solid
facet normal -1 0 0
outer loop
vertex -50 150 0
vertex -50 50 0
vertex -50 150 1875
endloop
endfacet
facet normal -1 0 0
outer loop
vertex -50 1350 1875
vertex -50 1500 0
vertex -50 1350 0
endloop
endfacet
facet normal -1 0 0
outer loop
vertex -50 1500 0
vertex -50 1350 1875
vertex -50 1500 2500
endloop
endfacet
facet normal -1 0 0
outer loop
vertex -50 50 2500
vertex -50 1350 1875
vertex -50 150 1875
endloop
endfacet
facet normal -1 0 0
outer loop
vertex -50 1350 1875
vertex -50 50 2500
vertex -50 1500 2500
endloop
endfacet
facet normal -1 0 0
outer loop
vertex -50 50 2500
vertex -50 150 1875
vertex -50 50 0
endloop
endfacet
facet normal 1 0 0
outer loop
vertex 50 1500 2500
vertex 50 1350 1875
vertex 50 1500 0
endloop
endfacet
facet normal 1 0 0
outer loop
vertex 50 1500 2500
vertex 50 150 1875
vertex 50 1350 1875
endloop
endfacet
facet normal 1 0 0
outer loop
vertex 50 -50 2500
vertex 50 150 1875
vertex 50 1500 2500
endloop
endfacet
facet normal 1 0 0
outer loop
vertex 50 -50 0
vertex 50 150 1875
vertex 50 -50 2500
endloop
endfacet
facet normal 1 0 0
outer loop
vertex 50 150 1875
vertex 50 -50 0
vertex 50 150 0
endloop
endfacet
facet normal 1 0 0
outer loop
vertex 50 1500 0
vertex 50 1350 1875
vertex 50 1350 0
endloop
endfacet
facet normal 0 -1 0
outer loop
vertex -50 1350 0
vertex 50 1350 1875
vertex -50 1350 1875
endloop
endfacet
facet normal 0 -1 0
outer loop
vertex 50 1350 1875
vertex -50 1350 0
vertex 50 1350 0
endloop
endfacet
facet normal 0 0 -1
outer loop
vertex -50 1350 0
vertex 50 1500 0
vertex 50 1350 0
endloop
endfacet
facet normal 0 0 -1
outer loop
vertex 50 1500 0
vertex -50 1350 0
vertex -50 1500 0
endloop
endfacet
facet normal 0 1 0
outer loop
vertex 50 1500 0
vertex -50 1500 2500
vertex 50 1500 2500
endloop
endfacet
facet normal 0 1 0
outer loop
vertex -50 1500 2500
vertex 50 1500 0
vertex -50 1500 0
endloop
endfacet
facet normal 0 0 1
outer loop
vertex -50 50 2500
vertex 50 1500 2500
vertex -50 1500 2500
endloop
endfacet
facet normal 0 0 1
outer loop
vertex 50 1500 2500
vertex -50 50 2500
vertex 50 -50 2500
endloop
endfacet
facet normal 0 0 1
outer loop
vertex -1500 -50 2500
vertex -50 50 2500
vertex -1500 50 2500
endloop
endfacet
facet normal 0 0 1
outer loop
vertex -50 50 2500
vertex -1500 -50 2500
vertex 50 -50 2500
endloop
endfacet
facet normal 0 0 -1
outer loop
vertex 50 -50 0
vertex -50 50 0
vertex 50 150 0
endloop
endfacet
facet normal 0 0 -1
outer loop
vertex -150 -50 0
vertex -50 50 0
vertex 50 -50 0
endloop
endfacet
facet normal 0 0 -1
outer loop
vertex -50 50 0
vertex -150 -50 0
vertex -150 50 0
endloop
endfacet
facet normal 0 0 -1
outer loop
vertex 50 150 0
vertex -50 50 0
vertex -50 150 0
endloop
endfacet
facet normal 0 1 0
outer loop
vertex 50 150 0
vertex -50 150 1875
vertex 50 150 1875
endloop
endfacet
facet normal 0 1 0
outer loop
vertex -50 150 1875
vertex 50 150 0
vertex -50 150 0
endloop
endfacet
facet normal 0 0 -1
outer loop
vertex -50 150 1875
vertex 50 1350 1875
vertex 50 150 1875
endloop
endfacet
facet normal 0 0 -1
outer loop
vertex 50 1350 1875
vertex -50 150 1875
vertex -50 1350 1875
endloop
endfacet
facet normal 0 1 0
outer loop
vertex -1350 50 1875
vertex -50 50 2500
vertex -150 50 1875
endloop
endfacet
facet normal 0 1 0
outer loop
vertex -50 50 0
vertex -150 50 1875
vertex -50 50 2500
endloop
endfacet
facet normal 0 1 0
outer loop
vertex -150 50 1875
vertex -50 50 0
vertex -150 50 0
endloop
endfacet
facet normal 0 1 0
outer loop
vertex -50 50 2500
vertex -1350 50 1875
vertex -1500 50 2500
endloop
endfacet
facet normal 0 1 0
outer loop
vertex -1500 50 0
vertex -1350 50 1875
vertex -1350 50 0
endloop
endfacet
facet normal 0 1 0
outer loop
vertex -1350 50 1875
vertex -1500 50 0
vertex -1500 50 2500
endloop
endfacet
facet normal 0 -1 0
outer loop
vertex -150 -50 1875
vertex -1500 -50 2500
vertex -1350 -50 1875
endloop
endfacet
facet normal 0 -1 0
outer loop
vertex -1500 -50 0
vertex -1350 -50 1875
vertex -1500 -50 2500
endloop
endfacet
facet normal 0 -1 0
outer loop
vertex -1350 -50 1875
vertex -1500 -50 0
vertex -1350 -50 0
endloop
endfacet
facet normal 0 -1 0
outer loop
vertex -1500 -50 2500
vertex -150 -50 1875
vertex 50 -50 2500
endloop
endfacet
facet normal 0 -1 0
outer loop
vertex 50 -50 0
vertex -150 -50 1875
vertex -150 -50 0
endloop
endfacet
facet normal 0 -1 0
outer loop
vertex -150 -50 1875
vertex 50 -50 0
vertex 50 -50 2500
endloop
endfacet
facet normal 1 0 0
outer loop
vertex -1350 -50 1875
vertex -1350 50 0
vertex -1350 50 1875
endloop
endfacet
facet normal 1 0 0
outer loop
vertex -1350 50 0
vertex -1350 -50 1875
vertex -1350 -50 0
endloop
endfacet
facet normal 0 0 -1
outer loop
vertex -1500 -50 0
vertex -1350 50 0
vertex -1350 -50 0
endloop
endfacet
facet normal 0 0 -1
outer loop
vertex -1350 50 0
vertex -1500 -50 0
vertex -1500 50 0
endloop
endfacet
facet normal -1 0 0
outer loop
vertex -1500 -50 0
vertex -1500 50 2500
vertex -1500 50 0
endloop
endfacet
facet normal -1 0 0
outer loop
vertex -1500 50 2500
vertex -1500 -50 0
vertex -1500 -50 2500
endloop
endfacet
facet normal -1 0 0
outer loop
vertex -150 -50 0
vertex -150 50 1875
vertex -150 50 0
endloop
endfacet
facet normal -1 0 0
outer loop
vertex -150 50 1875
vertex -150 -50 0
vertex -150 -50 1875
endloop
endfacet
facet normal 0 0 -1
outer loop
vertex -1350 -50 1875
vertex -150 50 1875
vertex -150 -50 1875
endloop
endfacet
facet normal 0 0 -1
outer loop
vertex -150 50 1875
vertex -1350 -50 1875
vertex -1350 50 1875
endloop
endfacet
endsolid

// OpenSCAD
// file: modifiers/diagonalize.scad
include <../templates/basic-dims.scad>

module diagonalize_triangle_sketch(t = section_thickness) {
    x = sin(45) * t;
    y = cos(45) * t;

    polygon([
        [0, y],
        [x, 0],
        [0, -y]
    ]);
}

module diagonalize_triangle(t = section_thickness) {
    rotate([0, 0, 90])
    linear_extrude(section_height)
    diagonalize_triangle_sketch(t);
}

module diagonalize2D() {
    thickness = section_thickness / rt;

    trans = (section_thickness/2)*rt/2;
    len_scale = rt - section_thickness / (rt * section_width);

    rotate([0, 0, 45])
    translate([trans, 0, 0])
    scale([len_scale, 1/rt, 1])
    children();
}


module diagonalize3D(w = section_width, t = section_thickness, edges = "trans") {

    trans = (t/2)*rt/2;
    len_scale = rt - t / (rt * w);

    edge_angle = edges == "cis" ? 270 : 180;
    
    diagonalize_triangle(t/rt);

    translate([-w, w, 0])
    rotate([0, 0, edge_angle]) // 180 For continue, -90 (270) for end
    diagonalize_triangle(t/rt);

    rotate([0, 0, 45])
    translate([0, trans, 0])
    scale([1/rt, len_scale, 1])
    children();
}
// file: templates/basic-dims.scad
unit = 1000;

section_width = unit * 1.5;
section_height = unit * 2.5;
section_thickness = unit * 0.1;

rt = sqrt(2);

//  -- Notes --
//  Z is UP
//  X is FORWARD (out of the screen)
// file: modifiers/cornerize.scad
include <../templates/basic-dims.scad>

trim_depth = 10000;

module cornerize_trim(amount, height = section_height) {
    difference() {
        children();
        translate([-trim_depth/2, 0, 0])
        cube([trim_depth, amount, height]);
    }
}

//  Child 0 is front
//  Child 1 is side
module cornerize(front_width = section_width, front_thickness = section_thickness,
    side_width = section_width, side_thickness = section_thickness) {
    
    new_front_size = front_width - side_thickness/2;
    front_scale_amt = new_front_size / front_width;
    
    new_side_size = side_width - front_thickness/2;
    side_scale_amt = new_side_size / side_width;

    //translate([0, side_thickness/2, 0])
    //scale([1, front_scale_amt, 1])
    cornerize_trim(side_thickness/2)
    children(0);

    rotate([0, 0, 90])
    cornerize_trim(front_thickness/2)
    children(1);

    translate([-front_thickness/2, -side_thickness/2, 0])
    cube([front_thickness, side_thickness, section_height]);
}
// file: door-segment.scad
include <./templates/basic-dims.scad>
include <./modifiers/diagonalize.scad>
door_width = section_width * 0.8;
door_height = section_height * 0.75;

wall_thickness = section_thickness;

module door_piece_sketch() {
    difference() {
        square([section_width, section_height]);

        translate([section_width/2 - door_width/2, 0, 0])
        square([door_width, door_height]);
    }   
}

module door_piece() {
    rotate([90, 0, 90])
    translate([0, 0, -wall_thickness/2])
    linear_extrude(wall_thickness)
    door_piece_sketch();
}

door_piece();
// main file
include <door-segment.scad>
include <./modifiers/cornerize.scad>

color([0.7, 1.0, 0.7])
translate([-section_width, 0, 0])
square([section_width, section_width]);

cornerize() {
    door_piece();
    door_piece();
}
